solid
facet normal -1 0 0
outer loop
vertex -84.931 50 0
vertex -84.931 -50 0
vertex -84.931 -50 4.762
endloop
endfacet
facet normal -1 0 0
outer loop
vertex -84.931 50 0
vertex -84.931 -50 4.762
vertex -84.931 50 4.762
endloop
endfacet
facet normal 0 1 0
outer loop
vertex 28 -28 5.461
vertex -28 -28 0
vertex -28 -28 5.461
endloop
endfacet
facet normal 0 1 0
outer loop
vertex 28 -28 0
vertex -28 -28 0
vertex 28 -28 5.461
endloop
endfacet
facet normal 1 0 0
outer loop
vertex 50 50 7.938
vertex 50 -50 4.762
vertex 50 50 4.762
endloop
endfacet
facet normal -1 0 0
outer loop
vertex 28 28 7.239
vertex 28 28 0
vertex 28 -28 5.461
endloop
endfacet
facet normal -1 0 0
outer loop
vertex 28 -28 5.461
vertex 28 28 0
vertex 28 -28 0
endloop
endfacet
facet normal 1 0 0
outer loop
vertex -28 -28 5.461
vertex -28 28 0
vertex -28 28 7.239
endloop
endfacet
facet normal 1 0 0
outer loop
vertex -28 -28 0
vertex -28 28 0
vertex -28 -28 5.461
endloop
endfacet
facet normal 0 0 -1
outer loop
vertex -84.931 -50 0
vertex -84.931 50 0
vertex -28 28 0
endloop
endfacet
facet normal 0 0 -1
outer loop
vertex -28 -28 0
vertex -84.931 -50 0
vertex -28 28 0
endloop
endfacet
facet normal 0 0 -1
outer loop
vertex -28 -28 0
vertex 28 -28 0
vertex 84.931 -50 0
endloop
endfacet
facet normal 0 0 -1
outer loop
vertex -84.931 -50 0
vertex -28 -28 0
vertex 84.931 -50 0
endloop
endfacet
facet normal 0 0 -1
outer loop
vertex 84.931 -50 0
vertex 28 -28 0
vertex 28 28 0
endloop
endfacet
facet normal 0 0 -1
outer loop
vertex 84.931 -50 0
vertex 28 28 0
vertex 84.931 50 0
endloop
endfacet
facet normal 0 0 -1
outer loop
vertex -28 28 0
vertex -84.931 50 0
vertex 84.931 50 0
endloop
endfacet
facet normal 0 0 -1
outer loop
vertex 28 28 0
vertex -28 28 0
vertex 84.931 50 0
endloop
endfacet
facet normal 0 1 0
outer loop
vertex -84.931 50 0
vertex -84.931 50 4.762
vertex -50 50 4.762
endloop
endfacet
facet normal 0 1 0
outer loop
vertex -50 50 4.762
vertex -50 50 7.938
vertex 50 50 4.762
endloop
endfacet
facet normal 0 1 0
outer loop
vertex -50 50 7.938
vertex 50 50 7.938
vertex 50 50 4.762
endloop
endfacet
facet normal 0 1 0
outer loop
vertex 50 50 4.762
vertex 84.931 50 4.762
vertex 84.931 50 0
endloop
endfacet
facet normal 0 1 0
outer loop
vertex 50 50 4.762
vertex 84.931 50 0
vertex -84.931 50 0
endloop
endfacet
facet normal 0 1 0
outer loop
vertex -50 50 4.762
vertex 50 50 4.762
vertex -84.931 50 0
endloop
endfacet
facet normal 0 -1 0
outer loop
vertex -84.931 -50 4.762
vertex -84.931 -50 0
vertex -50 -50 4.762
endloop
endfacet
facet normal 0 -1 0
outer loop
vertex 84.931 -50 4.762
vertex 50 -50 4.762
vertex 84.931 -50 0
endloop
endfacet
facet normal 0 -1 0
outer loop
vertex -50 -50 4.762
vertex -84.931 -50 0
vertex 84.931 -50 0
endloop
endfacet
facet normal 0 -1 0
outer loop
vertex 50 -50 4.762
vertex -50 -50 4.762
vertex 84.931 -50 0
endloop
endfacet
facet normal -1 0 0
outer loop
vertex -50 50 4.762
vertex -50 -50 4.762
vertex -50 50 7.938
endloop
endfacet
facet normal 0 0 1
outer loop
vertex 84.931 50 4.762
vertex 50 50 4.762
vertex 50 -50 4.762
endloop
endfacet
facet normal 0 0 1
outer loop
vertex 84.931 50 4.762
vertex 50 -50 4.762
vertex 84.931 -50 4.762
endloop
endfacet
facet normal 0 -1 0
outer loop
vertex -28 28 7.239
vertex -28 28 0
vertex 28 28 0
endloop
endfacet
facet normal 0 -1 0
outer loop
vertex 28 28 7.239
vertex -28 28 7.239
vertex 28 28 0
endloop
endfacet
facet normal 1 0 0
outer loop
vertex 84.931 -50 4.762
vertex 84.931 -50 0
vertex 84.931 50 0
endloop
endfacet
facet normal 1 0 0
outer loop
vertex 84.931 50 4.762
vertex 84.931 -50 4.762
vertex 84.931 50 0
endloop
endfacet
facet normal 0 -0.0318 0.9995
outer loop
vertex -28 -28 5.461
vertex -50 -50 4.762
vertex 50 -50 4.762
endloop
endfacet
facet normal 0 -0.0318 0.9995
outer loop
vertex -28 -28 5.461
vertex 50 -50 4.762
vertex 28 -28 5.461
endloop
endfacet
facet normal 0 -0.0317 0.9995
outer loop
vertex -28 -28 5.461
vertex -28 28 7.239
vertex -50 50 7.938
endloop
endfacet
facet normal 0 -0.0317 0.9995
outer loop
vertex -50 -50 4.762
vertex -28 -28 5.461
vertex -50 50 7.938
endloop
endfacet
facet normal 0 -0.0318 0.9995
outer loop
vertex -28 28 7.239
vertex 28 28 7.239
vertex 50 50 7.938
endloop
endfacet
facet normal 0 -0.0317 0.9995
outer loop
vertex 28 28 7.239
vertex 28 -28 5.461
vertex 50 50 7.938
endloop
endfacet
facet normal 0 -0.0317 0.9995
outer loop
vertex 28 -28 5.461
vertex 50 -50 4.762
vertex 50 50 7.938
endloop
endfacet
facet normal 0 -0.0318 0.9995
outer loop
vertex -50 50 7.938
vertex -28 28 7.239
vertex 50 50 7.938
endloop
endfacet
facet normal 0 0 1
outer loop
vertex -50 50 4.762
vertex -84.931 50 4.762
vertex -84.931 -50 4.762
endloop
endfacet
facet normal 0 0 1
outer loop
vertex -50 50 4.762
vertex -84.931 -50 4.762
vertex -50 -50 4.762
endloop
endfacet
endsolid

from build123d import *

# Parameters (mm, degrees)
F0_W     = 169.8625
F0_H     = 100
F1_DEPTH = 4.7625
F3_DEPTH = 50
F4_DEPTH = 50
F5_W     = 56
F5_H     = 56
F6_DEPTH = 7.9385


with BuildPart() as f1:
    # F0 (on Top) → F1 (new body)
    with BuildSketch(Plane.XY):
        Rectangle(F0_W, F0_H)
    extrude(amount=F1_DEPTH)

    # F2 (on Right) → F3 (join)
    with BuildSketch(Plane.YZ):
        Polygon((-50, 4.7625), (50, 4.7625), (50, 7.9375), align=None)
    extrude(amount=F3_DEPTH)

    # F3_face (on face) → F4 (join)
    with BuildSketch(Plane(origin=(0, 16.666667, 5.820833), x_dir=(0, 1, 0), z_dir=(-1, 0, 0))):
        Polygon((33.333333, 1.058333), (-66.666667, 1.058333), (33.333333, -2.116667), align=None)
    extrude(amount=F4_DEPTH)

    # F5 (on face) → F6 (cut, through all)
    with BuildSketch(Plane(origin=(0, 0, 0), x_dir=(1, 0, 0), z_dir=(0, 0, -1))):
        Rectangle(F5_W, F5_H)
    extrude(amount=-F6_DEPTH, mode=Mode.SUBTRACT)


solid = f1.part
